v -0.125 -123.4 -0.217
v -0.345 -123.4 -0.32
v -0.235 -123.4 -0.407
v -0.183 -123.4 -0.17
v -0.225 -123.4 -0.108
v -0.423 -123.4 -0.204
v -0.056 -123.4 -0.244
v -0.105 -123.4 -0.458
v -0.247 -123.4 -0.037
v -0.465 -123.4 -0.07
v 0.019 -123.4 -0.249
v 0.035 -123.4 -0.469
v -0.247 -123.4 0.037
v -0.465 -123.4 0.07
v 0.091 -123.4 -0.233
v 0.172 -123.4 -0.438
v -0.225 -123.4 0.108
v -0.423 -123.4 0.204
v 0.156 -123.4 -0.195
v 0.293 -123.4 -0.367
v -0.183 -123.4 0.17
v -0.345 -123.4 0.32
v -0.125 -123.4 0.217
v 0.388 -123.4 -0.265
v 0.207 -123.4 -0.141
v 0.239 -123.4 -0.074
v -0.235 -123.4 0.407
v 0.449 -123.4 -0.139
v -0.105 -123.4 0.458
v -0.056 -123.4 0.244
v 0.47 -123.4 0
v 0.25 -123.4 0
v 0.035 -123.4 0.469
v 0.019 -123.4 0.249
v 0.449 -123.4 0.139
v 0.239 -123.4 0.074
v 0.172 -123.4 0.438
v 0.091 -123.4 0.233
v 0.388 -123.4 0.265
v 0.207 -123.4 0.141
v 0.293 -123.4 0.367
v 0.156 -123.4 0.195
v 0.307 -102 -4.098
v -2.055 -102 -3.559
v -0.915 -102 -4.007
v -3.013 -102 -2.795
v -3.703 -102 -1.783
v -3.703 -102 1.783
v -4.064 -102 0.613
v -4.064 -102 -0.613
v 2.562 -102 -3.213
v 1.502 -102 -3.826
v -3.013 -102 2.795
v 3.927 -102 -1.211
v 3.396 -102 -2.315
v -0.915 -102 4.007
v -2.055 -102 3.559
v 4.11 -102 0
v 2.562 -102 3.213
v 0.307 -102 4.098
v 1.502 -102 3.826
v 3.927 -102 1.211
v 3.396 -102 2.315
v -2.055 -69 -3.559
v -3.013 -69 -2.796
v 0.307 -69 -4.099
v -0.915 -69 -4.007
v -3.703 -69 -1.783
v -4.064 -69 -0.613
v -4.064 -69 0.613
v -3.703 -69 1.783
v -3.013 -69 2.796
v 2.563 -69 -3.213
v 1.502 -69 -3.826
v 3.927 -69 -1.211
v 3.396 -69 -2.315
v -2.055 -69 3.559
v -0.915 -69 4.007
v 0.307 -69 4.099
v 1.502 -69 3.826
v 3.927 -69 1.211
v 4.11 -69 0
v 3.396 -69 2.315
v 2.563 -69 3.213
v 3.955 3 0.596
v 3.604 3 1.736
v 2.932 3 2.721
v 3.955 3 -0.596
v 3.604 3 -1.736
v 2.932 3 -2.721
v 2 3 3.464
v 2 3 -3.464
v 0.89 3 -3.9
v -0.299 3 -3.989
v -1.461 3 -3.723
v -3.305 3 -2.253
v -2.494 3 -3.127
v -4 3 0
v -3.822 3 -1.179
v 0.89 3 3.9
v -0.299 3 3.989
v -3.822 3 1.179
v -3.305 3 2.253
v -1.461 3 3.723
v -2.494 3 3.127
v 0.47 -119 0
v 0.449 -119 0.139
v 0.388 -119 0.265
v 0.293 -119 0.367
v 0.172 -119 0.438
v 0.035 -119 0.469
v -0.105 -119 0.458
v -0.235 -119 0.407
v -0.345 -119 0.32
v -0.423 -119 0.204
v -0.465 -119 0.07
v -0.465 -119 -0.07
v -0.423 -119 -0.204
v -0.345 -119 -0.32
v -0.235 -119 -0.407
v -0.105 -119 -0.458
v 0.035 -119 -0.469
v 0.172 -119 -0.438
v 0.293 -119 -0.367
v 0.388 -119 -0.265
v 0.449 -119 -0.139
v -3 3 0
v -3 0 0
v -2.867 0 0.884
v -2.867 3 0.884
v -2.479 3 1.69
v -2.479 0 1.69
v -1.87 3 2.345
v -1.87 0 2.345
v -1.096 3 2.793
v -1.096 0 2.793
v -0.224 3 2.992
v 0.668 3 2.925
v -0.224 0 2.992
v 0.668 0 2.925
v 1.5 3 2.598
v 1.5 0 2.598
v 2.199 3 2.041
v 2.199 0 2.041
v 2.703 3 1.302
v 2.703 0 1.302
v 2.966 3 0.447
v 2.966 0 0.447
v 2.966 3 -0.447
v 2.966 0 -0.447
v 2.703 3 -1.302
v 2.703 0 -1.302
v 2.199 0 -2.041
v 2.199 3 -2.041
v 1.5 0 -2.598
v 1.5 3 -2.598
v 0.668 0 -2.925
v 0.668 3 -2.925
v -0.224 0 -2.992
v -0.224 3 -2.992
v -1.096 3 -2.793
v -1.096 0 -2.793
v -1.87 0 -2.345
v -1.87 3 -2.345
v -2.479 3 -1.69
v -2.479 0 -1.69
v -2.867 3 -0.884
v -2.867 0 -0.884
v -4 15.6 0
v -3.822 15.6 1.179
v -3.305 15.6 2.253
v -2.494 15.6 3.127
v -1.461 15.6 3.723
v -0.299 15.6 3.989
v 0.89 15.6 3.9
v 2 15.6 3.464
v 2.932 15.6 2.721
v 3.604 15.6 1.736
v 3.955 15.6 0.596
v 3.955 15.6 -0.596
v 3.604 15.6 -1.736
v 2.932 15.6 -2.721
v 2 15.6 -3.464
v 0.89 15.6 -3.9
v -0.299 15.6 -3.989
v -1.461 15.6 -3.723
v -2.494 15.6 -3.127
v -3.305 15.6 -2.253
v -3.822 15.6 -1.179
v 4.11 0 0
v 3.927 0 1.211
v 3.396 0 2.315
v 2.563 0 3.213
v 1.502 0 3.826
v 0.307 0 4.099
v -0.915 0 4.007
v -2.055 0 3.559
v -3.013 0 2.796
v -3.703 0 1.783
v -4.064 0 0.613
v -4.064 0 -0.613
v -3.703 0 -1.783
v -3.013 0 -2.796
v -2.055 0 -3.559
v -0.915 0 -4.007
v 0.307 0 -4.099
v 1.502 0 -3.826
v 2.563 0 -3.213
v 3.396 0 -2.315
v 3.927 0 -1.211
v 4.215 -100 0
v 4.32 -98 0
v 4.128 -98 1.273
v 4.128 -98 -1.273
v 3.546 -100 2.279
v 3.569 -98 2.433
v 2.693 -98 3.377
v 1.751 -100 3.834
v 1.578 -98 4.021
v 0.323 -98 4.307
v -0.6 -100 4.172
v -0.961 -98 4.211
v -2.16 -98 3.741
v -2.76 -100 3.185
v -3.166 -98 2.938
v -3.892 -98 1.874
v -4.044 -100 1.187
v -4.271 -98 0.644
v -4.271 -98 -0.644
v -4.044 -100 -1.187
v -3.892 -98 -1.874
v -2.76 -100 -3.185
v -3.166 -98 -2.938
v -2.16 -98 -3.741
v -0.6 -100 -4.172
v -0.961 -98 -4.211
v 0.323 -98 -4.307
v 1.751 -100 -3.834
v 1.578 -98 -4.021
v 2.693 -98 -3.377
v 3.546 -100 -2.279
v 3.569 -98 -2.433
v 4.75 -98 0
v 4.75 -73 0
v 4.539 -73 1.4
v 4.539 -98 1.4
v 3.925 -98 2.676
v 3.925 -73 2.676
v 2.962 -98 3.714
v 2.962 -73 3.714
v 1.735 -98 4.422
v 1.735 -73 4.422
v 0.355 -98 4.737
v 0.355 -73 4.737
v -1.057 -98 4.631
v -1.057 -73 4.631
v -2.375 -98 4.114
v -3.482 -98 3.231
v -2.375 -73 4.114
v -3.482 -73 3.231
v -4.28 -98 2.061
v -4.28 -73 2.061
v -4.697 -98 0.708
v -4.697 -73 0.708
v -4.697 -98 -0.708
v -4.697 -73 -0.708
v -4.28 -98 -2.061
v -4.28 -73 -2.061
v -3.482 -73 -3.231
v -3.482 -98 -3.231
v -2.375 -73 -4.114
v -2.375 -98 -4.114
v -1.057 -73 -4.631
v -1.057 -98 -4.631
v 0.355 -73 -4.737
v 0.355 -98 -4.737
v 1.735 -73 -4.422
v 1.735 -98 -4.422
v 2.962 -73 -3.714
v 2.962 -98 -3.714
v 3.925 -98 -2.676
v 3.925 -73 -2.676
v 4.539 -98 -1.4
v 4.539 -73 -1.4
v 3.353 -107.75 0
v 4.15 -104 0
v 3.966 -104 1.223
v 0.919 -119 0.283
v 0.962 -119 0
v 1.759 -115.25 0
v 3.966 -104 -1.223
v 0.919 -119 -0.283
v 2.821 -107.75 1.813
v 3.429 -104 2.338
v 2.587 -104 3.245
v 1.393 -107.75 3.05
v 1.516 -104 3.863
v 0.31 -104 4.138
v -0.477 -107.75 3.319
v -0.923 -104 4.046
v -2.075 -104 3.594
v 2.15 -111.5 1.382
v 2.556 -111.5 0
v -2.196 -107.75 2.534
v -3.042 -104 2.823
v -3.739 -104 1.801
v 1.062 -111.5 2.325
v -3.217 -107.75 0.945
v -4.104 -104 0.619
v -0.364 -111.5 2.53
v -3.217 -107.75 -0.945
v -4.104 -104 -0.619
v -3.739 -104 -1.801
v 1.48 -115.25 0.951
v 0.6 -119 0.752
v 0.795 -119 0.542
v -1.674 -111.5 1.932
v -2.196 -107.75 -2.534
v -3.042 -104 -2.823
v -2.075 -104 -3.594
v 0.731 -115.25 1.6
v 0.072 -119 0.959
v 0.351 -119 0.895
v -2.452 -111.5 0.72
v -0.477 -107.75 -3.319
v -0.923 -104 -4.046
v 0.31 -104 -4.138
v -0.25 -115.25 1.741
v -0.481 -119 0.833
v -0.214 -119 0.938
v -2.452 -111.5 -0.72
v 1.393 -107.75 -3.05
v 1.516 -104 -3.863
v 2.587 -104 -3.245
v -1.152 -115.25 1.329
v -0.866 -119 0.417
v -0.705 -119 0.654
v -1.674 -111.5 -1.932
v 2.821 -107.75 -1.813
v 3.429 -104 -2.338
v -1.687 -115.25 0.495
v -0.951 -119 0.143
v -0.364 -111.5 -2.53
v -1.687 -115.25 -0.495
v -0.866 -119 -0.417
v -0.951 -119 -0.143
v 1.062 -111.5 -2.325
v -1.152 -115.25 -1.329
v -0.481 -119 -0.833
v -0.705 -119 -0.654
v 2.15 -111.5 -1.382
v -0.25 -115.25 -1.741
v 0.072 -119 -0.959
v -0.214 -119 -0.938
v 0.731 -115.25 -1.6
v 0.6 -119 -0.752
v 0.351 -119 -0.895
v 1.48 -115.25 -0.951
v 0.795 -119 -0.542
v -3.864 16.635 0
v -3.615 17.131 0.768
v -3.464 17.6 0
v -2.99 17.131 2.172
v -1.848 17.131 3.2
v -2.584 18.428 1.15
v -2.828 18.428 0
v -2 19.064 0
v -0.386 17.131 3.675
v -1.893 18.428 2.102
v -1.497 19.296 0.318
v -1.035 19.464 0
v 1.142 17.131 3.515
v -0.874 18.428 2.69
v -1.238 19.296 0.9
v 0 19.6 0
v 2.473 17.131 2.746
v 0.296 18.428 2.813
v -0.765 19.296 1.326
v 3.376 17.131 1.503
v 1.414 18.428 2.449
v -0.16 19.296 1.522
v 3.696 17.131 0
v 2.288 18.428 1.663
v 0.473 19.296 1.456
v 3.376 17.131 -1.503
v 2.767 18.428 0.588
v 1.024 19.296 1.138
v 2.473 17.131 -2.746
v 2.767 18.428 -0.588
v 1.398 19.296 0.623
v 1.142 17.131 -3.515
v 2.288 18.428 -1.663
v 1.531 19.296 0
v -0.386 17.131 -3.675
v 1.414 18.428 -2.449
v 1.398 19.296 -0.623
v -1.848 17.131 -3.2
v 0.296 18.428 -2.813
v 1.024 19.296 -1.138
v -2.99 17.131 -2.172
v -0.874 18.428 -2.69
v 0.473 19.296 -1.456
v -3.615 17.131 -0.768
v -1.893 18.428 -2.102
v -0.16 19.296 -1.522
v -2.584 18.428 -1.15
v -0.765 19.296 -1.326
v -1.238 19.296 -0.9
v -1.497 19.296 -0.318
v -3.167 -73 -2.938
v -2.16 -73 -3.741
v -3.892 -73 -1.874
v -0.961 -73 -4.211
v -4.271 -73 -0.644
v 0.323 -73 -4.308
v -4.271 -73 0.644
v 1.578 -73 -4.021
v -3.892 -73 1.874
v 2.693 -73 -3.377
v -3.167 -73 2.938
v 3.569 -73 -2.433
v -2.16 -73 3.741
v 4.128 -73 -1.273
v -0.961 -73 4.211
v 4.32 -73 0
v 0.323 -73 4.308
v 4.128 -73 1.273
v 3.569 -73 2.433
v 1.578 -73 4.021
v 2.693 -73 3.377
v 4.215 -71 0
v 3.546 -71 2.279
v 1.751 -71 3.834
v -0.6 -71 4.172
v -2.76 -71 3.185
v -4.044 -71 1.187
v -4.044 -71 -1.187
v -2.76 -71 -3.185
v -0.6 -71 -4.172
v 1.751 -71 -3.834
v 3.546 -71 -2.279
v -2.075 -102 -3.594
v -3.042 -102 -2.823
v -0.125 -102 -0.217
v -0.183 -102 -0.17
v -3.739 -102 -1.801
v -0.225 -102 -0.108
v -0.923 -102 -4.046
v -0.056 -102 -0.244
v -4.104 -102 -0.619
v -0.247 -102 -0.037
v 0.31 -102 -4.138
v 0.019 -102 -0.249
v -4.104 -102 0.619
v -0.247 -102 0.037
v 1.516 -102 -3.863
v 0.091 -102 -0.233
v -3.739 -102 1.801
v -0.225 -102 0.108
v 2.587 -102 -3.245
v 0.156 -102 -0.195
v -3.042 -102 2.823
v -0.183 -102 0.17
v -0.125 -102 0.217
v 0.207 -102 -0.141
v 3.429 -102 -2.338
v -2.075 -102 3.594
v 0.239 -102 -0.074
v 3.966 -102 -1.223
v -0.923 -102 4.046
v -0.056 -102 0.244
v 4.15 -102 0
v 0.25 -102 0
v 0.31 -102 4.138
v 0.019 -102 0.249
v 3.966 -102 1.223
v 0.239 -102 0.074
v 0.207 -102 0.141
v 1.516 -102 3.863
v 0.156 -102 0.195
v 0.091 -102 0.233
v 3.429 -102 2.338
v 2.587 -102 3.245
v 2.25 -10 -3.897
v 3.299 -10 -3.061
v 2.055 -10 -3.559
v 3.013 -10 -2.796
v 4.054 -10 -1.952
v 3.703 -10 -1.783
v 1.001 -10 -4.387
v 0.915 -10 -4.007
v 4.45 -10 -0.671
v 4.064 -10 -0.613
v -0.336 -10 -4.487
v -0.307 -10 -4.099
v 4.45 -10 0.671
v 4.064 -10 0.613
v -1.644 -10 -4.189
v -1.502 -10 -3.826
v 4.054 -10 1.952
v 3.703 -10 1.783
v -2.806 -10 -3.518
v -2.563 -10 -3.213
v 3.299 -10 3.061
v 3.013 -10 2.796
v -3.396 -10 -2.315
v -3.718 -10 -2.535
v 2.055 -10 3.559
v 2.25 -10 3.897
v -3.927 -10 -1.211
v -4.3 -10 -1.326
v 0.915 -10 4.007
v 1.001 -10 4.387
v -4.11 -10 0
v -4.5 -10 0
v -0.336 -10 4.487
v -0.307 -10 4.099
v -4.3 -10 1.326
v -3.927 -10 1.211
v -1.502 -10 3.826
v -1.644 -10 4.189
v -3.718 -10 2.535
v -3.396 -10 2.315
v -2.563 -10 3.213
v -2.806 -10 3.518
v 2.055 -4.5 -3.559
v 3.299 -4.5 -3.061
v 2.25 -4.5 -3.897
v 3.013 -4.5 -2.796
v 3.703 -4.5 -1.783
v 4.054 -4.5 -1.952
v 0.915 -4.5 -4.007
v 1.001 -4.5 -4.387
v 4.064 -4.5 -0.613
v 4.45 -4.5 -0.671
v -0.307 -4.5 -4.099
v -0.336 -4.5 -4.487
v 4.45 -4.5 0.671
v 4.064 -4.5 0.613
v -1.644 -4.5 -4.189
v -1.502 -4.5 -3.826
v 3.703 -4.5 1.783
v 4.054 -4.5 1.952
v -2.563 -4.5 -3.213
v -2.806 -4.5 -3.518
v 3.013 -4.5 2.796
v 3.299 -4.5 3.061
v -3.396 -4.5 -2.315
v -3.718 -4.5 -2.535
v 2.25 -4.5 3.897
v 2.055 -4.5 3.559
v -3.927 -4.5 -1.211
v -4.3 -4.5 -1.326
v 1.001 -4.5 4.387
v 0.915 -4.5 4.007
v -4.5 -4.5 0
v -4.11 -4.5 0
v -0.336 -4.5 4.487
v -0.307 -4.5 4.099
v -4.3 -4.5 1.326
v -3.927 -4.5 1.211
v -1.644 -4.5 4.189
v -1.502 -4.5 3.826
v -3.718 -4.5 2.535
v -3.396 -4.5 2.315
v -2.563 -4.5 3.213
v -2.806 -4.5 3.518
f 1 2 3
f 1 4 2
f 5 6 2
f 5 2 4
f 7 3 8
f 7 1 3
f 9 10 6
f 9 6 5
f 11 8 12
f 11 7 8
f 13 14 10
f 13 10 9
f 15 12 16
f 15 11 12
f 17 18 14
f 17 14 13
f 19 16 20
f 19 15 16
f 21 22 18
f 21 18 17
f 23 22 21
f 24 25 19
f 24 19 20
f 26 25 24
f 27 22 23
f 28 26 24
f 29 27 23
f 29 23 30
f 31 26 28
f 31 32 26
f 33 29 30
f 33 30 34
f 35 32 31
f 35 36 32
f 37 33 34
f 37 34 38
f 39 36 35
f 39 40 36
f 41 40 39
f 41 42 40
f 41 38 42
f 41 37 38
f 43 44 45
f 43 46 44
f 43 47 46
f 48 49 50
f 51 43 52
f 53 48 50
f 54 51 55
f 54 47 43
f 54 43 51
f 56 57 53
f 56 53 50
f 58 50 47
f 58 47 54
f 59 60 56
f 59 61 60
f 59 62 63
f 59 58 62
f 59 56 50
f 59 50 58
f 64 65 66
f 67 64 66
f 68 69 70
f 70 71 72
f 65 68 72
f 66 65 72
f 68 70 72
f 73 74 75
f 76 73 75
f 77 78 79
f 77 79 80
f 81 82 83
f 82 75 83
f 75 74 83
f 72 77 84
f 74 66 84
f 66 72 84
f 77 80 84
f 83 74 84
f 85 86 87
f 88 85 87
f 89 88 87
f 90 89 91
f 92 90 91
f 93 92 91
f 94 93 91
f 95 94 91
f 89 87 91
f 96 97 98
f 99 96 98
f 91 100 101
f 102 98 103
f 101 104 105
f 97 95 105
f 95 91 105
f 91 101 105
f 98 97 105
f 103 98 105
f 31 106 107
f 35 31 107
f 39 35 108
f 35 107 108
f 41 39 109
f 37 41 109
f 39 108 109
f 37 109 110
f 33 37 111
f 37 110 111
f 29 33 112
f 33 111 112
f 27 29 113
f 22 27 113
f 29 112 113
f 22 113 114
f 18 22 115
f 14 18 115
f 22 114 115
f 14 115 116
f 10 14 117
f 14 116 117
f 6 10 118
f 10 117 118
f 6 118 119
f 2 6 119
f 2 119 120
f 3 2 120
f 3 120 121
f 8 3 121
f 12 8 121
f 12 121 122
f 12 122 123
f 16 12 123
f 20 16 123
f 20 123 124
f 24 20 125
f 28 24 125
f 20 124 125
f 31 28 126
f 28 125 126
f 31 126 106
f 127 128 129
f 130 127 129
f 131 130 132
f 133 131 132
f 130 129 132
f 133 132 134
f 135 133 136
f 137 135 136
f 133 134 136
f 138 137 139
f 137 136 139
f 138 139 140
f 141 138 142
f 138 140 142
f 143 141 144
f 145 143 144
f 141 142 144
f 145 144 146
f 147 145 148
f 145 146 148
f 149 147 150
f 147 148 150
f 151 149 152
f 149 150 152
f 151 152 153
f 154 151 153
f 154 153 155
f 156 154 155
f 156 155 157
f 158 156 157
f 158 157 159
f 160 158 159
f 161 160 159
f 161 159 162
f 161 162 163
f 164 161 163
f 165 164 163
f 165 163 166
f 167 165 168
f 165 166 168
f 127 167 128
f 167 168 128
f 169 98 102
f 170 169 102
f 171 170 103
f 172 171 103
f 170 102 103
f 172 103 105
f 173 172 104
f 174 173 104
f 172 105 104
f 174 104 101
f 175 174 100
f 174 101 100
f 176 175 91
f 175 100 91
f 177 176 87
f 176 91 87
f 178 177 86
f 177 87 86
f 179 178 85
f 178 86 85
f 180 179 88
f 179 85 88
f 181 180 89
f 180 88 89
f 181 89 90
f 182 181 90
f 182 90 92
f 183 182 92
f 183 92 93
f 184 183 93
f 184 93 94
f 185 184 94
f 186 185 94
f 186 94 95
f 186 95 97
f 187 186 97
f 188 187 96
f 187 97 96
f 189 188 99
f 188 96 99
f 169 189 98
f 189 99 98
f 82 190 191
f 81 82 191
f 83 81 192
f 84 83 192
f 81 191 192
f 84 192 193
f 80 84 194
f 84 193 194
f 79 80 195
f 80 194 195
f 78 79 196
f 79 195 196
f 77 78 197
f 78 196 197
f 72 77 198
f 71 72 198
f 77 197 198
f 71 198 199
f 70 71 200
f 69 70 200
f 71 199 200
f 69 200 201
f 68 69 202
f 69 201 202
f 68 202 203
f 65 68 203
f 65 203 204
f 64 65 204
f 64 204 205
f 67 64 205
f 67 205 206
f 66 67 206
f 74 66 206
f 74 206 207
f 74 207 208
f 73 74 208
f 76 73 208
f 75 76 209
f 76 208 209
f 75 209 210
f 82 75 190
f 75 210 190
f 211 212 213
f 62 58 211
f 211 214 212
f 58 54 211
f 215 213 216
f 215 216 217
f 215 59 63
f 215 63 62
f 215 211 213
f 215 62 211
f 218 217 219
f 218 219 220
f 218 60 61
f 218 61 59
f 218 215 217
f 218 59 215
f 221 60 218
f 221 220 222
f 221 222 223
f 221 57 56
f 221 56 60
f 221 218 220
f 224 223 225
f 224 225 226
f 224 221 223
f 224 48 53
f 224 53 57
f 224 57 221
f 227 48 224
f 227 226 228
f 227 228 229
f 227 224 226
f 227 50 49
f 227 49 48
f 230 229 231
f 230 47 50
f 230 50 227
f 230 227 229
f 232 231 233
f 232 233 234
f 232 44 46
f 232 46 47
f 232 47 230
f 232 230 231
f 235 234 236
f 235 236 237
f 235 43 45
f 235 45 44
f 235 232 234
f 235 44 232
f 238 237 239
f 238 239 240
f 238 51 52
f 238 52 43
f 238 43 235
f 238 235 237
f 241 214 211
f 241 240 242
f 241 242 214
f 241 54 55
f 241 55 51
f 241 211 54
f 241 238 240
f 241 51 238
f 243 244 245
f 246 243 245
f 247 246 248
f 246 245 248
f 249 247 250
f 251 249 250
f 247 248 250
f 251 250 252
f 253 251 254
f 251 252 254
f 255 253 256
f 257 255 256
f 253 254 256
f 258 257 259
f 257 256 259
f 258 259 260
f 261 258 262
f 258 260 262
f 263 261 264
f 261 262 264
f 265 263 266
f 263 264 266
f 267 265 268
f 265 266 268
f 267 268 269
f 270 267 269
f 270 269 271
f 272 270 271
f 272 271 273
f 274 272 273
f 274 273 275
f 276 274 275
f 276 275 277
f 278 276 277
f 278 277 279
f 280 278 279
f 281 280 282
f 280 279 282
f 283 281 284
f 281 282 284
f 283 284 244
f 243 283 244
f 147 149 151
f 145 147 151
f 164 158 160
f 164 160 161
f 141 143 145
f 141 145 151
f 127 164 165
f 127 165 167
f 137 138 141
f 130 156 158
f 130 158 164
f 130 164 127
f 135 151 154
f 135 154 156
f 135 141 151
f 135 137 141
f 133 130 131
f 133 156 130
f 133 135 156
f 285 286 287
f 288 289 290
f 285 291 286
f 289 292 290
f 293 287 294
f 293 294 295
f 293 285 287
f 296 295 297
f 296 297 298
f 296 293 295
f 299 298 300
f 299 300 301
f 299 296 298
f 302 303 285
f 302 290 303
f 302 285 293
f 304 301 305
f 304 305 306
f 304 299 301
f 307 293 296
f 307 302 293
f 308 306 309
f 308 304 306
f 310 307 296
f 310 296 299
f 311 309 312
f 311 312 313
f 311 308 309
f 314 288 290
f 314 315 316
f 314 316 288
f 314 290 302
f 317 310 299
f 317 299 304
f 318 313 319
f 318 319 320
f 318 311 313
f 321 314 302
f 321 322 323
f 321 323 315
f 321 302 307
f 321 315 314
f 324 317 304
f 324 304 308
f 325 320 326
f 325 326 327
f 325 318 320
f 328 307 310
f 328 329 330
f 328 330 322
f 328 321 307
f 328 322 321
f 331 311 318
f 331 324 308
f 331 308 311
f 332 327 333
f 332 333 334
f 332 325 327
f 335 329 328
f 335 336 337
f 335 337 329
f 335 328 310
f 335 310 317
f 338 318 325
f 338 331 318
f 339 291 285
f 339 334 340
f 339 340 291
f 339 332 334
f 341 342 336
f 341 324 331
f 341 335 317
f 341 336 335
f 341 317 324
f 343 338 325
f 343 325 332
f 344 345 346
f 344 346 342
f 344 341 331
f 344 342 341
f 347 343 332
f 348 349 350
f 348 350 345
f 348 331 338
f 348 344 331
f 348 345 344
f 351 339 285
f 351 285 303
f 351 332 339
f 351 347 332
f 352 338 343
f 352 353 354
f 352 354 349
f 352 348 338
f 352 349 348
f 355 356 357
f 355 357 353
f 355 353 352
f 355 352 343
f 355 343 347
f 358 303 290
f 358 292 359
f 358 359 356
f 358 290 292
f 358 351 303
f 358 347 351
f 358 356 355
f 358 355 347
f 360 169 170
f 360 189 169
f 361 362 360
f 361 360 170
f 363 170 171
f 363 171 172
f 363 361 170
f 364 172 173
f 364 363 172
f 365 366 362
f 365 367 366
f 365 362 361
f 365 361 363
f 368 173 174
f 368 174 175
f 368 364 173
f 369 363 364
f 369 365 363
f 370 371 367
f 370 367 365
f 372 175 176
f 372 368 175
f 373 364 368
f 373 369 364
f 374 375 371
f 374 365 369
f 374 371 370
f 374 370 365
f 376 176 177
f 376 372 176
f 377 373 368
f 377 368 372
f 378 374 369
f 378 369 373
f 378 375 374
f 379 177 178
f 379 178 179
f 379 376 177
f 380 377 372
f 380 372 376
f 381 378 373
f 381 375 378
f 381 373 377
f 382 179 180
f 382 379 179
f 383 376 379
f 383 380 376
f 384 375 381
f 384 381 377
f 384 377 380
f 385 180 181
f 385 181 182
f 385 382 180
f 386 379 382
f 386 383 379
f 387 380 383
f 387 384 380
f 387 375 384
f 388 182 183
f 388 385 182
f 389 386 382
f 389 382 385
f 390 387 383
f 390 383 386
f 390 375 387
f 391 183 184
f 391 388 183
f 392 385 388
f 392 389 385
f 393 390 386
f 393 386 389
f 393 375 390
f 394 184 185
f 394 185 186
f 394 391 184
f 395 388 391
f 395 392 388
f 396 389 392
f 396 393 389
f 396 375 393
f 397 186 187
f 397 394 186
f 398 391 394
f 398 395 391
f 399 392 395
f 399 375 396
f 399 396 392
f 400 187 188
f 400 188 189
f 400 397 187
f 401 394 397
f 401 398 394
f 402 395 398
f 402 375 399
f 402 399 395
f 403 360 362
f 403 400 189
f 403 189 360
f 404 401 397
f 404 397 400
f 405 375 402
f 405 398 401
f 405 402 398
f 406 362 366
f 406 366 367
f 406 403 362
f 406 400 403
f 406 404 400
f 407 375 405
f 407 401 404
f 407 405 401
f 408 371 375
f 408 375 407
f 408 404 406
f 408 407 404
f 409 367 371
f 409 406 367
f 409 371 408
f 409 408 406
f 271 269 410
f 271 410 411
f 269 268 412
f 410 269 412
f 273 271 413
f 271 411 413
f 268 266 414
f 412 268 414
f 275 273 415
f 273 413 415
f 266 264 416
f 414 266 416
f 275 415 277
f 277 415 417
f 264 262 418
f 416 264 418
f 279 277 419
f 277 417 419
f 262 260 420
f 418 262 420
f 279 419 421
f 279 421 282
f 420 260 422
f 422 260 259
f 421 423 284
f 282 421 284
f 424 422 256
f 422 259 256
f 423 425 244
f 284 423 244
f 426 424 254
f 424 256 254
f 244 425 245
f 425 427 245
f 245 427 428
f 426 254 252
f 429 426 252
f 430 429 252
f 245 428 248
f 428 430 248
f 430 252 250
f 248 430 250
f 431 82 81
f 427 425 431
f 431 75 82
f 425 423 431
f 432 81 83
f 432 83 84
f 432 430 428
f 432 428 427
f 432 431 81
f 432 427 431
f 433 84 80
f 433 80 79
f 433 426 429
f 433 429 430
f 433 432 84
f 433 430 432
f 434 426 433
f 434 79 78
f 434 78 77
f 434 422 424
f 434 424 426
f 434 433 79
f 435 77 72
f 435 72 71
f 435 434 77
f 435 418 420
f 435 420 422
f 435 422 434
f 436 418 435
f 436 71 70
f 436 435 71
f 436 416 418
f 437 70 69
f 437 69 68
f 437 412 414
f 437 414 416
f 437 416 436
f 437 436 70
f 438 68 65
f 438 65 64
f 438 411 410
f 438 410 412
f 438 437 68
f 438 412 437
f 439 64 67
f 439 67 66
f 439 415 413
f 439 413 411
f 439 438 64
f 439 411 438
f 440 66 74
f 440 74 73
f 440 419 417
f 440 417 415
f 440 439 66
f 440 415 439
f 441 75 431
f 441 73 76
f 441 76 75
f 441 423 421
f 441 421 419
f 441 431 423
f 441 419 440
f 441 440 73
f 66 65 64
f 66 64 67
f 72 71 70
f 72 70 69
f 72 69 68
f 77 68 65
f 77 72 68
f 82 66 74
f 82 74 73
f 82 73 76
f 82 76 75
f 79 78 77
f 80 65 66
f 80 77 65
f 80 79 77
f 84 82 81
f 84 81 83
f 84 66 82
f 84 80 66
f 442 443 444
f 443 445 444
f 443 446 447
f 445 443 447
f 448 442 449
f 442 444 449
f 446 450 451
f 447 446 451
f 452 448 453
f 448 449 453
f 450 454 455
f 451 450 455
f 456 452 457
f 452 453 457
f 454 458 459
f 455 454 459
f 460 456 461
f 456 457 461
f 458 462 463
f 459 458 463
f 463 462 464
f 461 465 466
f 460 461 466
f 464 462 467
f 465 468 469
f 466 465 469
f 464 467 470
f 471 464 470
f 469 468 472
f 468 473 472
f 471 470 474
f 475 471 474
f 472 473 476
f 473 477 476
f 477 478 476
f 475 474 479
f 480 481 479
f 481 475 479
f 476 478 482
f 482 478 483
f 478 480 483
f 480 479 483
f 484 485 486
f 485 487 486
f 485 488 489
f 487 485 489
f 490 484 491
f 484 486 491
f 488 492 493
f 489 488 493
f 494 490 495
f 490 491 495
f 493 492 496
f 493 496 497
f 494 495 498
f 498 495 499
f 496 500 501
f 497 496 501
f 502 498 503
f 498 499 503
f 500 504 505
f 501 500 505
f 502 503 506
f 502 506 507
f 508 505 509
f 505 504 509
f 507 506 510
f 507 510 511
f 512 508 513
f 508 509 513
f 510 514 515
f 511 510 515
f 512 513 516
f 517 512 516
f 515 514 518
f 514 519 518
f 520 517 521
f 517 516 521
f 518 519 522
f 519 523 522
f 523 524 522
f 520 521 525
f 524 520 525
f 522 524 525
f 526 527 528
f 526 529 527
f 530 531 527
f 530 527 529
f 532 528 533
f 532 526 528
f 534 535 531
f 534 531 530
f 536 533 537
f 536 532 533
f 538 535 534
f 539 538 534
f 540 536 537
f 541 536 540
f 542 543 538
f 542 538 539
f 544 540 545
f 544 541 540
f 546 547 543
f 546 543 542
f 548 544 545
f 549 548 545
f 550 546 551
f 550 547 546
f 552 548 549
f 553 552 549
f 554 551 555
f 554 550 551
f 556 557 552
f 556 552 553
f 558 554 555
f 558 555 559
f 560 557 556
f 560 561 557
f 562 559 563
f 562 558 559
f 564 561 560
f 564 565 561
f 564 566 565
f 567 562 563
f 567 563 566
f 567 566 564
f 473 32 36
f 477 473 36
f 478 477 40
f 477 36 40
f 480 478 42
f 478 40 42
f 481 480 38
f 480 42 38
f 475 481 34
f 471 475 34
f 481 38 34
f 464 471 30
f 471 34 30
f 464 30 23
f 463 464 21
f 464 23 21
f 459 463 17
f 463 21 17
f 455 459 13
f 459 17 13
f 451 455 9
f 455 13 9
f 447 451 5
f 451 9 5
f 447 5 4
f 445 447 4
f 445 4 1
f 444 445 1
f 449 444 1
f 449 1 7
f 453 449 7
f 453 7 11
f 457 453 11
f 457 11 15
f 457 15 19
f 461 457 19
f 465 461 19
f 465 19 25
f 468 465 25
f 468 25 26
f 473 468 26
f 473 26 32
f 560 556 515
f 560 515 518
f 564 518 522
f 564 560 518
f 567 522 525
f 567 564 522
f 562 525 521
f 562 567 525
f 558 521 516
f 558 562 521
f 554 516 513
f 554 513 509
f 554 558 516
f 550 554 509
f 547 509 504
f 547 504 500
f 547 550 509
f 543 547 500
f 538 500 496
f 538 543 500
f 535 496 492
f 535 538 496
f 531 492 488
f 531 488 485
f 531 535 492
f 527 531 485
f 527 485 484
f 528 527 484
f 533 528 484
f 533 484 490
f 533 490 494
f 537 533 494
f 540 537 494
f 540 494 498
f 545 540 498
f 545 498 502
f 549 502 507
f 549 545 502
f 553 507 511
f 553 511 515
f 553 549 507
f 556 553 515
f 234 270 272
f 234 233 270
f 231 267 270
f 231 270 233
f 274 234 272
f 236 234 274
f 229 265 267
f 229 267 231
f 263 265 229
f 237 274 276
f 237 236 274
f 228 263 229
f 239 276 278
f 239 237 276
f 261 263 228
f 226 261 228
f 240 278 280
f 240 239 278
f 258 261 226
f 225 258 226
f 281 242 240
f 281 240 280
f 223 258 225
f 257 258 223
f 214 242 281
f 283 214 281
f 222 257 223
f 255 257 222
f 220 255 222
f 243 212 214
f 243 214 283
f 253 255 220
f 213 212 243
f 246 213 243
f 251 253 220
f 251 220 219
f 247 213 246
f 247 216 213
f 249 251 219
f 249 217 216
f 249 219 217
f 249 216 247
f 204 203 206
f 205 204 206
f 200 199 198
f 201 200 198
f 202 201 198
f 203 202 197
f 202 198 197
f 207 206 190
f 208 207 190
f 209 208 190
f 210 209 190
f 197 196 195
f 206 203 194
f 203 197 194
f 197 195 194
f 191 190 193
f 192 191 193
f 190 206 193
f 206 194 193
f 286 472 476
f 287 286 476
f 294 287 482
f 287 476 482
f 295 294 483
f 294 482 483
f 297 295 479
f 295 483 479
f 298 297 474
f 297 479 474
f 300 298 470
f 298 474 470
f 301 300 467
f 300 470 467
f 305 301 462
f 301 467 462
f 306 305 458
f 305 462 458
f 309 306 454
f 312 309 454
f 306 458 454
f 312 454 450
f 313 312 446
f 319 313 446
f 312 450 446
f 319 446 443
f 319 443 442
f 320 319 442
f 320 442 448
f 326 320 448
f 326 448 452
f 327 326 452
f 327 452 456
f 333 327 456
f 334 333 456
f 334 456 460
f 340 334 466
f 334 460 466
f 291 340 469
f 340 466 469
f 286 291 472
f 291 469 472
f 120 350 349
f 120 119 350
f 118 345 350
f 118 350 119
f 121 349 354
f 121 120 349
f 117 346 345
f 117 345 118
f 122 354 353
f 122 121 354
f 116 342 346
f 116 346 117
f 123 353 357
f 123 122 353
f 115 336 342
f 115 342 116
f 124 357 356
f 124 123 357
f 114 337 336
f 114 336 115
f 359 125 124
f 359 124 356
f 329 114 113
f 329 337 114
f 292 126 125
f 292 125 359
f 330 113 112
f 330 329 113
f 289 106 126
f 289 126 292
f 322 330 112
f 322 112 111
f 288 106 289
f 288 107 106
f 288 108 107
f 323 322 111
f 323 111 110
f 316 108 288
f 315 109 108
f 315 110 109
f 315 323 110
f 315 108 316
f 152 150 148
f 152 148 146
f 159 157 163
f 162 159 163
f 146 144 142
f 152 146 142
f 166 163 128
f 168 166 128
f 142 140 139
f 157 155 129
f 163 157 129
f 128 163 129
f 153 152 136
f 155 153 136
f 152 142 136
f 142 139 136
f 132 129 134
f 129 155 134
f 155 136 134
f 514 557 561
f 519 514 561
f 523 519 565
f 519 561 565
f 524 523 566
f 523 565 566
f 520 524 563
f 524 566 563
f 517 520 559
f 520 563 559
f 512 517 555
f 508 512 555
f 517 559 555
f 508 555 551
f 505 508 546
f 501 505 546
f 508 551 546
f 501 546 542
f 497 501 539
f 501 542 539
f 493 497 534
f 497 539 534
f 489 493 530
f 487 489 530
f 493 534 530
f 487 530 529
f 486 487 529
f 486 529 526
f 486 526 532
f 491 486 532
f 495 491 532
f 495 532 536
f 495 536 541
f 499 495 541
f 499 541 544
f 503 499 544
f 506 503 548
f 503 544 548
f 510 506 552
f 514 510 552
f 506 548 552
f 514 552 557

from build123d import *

# Parameters (mm, degrees)
F0_R      = 4.11
F1_DEPTH  = 69
F2_R      = 3
F3_DEPTH  = 3
F4_R      = 4
F5_DEPTH  = 16.6
F6_R      = 4
F7_R      = 4.11
F8_DEPTH  = 4
F8_TAPER  = -3
F9_R      = 4.75
F10_DEPTH = 25
F11_R     = 4.3195
F12_DEPTH = 4
F12_TAPER = 3
F15_R     = 4.15
F16_DEPTH = 2
F17_R     = 4.15
F18_DEPTH = 15
F18_TAPER = 12
F19_R     = 0.47
F20_DEPTH = 4.4
F21_R     = 0.25
F22_DEPTH = 25
F25_R     = 4.5
F25_R_2   = 4.11
F26_DEPTH = 5.5


# Not quite as in the source:
# - a feature of the source that left no trace in its solid (it failed there, or was rolled back) is left out


with BuildPart() as f1:
    # F0 (on Front) → F1 (new body)
    with BuildSketch(Plane.XZ):
        Circle(F0_R)
    extrude(amount=F1_DEPTH)


with BuildPart() as f3:
    # F2 (on face) → F3 (new body)
    with BuildSketch(Plane(origin=(0, 0, 0), x_dir=(-1, 0, 0), z_dir=(0, 1, 0))):
        Circle(F2_R)
    extrude(amount=F3_DEPTH)


with BuildPart() as f5:
    # F4 (on face) → F5 (new body)
    with BuildSketch(Plane(origin=(0, 3, 0), x_dir=(-1, 0, 0), z_dir=(0, 1, 0))):
        Circle(F4_R)
    extrude(amount=F5_DEPTH)

    # F6
    f6_edges = [f5.edges().sort_by_distance(p)[0] for p in [
        (4, 19.6, 0),
    ]]
    fillet(f6_edges, radius=F6_R)


with BuildPart() as f8:
    # F7 (on face) → F8 (new body)
    with BuildSketch(Plane.XZ.offset(69)):
        Circle(F7_R)
    extrude(amount=F8_DEPTH, taper=F8_TAPER)

    # F9 (on face) → F10 (join)
    with BuildSketch(Plane.XZ.offset(73)):
        Circle(F9_R)
    extrude(amount=F10_DEPTH)

    # F11 (on face) → F12 (join)
    with BuildSketch(Plane.XZ.offset(98)):
        Circle(F11_R)
    extrude(amount=F12_DEPTH, taper=F12_TAPER)


with BuildPart() as f16:
    # F15 (on face) → F16 (new body)
    with BuildSketch(Plane.XZ.offset(102)):
        Circle(F15_R)
    extrude(amount=F16_DEPTH)

    # F17 (on face) → F18 (join)
    with BuildSketch(Plane.XZ.offset(104)):
        Circle(F17_R)
    extrude(amount=F18_DEPTH, taper=F18_TAPER)

    # F19 (on face) → F20 (join)
    with BuildSketch(Plane.XZ.offset(119)):
        Circle(F19_R)
    extrude(amount=F20_DEPTH)

    # F21 (on face) → F22 (cut)
    with BuildSketch(Plane.XZ.offset(123.4)):
        Circle(F21_R)
    extrude(amount=-F22_DEPTH, mode=Mode.SUBTRACT)


with BuildPart() as f26:
    # F25 (on offset) → F26 (new body)
    with BuildSketch(Plane(origin=(0, -4.5, 0), x_dir=(-1, 0, 0), z_dir=(0, 1, 0))):
        Circle(F25_R)
        Circle(F25_R_2, mode=Mode.SUBTRACT)
    extrude(amount=-F26_DEPTH)


solid = Compound([f1.part, f3.part, f5.part, f8.part, f16.part, f26.part])
